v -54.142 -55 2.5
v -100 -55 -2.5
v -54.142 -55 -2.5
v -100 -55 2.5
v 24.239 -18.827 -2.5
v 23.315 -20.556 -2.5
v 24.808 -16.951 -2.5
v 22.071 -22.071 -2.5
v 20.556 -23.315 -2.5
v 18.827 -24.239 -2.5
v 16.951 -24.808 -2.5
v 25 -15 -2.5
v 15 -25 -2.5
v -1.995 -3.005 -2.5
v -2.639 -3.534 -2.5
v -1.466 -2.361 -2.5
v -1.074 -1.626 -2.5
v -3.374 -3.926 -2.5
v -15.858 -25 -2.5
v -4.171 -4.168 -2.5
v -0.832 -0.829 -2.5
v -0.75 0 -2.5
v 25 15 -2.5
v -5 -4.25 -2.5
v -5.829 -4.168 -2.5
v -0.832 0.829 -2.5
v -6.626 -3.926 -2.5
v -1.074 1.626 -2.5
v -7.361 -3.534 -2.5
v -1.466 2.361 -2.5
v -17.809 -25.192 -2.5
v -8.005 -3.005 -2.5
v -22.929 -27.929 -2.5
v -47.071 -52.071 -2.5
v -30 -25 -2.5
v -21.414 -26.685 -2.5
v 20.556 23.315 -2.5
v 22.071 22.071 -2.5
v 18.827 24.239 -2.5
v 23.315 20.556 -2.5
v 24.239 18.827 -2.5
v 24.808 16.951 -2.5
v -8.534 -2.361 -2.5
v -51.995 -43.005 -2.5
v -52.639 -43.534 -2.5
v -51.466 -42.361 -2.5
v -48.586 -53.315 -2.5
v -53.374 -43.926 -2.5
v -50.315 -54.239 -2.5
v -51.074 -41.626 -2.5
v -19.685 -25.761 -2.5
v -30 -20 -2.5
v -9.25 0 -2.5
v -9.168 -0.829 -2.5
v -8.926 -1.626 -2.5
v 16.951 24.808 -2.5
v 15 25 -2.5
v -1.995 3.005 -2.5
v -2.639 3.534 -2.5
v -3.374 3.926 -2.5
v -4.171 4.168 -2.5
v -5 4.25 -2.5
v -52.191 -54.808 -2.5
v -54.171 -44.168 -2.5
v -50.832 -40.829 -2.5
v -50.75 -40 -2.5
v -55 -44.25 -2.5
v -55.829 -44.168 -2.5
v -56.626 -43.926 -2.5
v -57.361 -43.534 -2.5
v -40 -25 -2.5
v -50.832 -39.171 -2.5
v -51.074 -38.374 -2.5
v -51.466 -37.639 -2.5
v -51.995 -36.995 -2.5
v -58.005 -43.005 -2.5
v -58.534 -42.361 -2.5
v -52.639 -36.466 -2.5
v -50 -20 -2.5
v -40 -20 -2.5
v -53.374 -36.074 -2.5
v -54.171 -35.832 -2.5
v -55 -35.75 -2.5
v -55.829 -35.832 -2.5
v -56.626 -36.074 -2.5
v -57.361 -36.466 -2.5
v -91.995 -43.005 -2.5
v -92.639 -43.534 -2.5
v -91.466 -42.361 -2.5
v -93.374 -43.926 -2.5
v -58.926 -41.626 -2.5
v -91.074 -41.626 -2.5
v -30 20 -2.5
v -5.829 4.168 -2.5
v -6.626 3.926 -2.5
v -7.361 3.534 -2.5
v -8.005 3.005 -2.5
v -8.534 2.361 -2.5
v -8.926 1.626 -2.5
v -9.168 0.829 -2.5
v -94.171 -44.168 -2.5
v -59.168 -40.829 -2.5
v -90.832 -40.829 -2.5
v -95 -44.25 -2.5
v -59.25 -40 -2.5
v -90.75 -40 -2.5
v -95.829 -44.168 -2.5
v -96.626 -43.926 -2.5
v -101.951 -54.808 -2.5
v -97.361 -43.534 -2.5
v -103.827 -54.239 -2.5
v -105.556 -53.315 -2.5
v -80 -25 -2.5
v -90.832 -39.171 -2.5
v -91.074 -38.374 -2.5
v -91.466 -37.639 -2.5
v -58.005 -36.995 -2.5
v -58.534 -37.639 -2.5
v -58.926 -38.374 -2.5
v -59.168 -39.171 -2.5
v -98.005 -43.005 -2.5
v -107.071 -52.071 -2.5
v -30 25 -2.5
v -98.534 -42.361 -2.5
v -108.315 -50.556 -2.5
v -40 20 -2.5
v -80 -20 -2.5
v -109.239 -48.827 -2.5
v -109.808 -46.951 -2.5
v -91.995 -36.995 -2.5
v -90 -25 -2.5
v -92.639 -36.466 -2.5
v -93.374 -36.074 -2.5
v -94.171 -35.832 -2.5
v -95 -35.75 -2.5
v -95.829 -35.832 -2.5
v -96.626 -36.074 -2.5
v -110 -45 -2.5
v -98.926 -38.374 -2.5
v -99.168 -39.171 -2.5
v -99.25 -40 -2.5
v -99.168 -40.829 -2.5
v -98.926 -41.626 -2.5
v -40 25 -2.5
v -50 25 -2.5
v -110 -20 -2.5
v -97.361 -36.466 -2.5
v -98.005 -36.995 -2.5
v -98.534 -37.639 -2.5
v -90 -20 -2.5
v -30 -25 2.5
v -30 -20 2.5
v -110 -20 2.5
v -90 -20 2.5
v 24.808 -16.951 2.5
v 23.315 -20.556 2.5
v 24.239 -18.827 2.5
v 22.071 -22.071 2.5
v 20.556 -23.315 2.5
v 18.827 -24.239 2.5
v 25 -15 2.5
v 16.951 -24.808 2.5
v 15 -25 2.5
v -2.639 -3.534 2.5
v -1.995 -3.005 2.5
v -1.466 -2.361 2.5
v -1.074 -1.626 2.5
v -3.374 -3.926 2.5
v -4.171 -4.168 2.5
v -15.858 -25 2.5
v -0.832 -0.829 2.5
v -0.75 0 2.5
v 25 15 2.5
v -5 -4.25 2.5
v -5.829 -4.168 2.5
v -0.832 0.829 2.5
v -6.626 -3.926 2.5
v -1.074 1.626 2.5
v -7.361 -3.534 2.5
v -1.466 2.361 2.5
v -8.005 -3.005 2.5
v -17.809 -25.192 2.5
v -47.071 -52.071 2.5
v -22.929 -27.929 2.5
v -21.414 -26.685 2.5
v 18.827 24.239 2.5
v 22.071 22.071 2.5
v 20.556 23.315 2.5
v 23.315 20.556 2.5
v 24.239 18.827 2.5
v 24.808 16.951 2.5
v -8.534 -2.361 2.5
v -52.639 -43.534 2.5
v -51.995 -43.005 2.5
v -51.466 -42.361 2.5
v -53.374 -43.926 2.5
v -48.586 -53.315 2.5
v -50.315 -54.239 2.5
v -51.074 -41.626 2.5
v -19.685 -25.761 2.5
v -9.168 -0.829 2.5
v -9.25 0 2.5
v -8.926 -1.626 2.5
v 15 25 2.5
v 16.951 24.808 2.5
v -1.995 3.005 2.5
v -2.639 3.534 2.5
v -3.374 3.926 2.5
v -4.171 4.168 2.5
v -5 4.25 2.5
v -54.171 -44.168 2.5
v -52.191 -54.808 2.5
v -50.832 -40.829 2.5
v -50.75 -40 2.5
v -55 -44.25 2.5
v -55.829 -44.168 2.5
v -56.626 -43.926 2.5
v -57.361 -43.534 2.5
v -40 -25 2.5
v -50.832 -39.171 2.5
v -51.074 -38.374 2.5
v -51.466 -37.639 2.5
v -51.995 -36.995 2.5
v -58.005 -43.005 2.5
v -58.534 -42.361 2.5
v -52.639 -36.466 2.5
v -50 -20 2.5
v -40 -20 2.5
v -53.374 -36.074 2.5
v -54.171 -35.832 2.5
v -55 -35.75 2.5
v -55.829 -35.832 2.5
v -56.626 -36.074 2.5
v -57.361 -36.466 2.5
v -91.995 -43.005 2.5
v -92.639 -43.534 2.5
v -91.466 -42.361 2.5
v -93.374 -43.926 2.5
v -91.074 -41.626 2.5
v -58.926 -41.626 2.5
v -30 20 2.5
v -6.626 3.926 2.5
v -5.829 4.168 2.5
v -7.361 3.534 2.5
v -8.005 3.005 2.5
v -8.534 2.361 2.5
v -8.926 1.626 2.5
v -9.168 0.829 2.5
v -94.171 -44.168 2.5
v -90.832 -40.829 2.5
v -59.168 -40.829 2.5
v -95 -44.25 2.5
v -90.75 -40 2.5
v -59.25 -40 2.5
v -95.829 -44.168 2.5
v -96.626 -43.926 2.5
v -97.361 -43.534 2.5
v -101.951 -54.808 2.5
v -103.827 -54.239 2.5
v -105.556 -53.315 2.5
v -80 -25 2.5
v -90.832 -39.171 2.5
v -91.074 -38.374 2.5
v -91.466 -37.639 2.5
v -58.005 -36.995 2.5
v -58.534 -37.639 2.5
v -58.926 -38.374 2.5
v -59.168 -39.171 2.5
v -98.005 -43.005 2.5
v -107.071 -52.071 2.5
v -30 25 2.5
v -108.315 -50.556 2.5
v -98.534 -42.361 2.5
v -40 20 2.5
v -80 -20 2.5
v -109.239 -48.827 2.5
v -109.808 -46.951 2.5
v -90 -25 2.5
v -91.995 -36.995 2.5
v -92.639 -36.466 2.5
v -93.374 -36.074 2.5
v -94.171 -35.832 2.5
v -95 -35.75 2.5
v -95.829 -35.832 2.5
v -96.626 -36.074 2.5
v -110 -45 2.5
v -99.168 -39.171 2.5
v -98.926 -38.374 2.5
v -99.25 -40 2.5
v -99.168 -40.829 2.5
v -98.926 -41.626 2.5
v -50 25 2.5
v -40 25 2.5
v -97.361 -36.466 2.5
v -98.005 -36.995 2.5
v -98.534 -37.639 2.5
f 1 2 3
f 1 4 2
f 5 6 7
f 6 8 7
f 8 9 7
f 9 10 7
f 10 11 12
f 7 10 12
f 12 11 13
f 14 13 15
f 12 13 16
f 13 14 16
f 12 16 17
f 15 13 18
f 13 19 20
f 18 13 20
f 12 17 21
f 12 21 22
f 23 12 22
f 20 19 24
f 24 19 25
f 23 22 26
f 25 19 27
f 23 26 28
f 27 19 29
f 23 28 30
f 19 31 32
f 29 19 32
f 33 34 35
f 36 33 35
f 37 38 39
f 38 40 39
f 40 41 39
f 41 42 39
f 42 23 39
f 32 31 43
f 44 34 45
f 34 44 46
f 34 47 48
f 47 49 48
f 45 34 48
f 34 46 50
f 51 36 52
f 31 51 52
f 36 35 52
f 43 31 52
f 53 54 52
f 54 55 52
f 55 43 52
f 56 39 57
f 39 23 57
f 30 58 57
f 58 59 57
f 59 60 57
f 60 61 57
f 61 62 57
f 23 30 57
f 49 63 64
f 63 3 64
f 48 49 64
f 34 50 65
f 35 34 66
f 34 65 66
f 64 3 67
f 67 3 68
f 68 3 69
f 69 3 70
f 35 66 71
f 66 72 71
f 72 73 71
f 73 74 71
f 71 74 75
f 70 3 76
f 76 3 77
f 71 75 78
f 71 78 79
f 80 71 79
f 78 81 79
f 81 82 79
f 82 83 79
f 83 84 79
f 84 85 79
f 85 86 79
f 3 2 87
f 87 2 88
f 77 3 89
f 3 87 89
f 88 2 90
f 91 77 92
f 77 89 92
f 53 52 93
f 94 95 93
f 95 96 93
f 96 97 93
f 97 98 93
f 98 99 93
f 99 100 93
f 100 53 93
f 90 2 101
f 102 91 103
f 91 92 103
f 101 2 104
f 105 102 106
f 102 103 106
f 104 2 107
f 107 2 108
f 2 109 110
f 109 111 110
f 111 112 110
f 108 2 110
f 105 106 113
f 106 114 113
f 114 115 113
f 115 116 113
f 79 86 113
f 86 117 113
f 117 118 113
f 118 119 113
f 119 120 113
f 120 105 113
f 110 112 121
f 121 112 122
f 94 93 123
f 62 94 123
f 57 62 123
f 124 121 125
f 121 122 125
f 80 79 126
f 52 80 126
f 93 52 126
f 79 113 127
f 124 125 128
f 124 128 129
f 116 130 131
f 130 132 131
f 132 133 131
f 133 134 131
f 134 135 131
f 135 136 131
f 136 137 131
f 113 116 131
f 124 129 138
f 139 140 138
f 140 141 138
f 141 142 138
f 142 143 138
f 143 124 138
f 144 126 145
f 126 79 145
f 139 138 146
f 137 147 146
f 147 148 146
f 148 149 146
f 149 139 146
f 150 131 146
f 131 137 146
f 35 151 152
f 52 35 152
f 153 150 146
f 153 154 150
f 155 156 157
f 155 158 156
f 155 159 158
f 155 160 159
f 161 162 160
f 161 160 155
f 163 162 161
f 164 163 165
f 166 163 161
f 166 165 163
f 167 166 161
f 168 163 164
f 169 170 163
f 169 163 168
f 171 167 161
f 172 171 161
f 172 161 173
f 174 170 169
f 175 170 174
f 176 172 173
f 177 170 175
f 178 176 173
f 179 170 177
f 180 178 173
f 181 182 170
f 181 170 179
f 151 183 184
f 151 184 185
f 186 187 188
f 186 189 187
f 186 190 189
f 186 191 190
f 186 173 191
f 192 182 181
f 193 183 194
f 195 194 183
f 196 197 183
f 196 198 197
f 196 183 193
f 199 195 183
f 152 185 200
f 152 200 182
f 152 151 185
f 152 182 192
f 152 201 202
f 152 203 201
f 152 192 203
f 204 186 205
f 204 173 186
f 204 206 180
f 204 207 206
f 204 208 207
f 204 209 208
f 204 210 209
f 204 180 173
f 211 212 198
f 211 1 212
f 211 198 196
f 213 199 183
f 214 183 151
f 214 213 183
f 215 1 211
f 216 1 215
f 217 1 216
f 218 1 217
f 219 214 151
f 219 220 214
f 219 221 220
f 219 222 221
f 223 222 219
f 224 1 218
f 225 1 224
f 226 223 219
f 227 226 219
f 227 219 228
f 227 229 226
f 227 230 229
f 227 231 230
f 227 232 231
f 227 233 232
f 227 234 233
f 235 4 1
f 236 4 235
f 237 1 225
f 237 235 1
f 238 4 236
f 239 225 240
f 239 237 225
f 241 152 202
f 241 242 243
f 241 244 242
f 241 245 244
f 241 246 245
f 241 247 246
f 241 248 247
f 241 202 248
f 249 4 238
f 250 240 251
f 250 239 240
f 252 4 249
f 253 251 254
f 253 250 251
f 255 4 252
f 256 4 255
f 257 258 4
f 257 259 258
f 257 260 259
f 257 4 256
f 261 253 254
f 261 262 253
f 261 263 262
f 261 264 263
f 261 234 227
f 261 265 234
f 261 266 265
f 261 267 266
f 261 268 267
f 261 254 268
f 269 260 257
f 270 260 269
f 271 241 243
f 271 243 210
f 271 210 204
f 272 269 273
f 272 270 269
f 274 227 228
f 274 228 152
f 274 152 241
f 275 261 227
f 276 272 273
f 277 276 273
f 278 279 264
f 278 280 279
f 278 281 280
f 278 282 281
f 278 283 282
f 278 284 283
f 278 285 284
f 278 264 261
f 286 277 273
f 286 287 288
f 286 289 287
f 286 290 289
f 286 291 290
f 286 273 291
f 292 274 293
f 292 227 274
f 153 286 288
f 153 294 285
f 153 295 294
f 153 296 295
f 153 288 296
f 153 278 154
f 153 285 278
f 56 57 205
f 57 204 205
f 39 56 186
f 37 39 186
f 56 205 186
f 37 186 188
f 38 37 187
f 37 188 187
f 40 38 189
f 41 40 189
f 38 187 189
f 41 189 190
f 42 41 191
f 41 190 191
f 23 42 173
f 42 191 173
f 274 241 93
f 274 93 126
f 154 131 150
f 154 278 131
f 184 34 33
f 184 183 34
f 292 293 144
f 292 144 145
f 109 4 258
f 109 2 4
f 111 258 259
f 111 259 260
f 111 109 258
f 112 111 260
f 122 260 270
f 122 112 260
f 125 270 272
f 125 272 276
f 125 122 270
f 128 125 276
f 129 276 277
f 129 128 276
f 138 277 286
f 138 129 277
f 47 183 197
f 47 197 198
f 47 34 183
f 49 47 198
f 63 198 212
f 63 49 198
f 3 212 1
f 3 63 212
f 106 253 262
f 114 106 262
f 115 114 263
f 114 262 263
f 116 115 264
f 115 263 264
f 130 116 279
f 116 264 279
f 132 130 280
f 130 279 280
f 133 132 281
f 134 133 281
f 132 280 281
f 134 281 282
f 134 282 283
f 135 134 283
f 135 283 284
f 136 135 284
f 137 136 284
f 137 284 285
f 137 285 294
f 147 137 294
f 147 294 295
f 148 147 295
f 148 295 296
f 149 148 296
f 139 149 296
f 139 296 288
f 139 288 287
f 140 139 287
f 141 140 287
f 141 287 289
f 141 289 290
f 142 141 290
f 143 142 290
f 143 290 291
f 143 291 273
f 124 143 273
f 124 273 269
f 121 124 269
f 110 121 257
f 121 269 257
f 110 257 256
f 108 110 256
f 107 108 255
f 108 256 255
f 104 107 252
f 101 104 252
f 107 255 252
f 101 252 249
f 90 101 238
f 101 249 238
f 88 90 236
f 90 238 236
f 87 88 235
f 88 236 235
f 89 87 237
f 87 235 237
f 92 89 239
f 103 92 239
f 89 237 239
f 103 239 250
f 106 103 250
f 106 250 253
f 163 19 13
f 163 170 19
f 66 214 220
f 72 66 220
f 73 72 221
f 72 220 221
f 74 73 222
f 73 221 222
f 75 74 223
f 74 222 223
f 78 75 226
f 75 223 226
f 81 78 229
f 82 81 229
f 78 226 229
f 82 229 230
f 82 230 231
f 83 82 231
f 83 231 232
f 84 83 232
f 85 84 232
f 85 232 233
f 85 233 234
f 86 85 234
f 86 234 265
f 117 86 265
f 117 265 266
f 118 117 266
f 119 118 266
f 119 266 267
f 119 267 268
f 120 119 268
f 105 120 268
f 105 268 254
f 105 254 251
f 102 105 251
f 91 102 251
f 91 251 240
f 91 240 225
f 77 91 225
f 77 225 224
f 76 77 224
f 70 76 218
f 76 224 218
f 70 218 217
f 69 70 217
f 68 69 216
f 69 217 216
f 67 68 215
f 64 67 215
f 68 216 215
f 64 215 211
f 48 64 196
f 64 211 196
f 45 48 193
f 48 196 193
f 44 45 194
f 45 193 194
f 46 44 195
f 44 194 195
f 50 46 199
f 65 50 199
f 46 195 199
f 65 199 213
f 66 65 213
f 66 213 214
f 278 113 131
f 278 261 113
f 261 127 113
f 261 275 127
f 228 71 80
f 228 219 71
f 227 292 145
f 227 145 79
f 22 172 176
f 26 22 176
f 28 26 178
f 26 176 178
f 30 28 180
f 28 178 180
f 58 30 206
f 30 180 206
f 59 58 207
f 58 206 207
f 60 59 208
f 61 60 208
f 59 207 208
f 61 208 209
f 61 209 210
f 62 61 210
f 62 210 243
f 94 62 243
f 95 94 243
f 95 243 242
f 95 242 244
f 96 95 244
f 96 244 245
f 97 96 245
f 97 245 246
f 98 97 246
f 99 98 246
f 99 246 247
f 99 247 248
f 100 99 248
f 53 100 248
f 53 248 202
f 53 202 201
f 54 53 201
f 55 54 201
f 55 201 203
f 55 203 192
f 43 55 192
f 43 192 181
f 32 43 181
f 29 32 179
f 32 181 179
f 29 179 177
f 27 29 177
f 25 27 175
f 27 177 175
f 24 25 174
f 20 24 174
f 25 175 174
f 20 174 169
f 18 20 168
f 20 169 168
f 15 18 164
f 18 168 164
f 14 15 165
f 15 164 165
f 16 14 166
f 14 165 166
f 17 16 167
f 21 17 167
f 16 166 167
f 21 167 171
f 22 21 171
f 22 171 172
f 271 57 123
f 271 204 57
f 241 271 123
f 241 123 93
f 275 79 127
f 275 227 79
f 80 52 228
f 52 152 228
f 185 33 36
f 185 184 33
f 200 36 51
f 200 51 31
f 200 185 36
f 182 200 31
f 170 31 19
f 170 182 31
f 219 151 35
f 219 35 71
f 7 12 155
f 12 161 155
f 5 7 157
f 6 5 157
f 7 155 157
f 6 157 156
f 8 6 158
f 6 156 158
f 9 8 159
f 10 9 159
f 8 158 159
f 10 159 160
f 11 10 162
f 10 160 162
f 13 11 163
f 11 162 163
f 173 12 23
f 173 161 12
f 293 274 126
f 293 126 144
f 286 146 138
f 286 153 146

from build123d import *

# Parameters (mm, degrees)
SKETCH1_W           = 5
SKETCH1_H           = 10
BOSS_EXTRUDE1_DEPTH = 2.5
FILLET1_R           = 10
CUT_EXTRUDE1_REACH  = 125.085
SKETCH2_R           = 4.25


with BuildPart() as part:
    # Sketch1 → Boss-Extrude1 (new, symmetric)
    with BuildSketch(Plane(origin=(0, 0, 0), x_dir=(0, 1, 0), z_dir=(0, 0, 1))):
        Polygon((-55, 50), (-25, 20), (-25, -25), (25, -25), (25, 30), (20, 30), (20, 40), (25, 40), (25, 50), (-20, 50), (-20, 80), (-25, 80), (-25, 90), (-20, 90), (-20, 110), (-55, 110), align=None)
        with Locations((-22.5, 35)):
            Rectangle(SKETCH1_W, SKETCH1_H, mode=Mode.SUBTRACT)
    extrude(amount=BOSS_EXTRUDE1_DEPTH, both=True)

    # Fillet1
    fillet1_edges = [part.edges().sort_by_distance(p)[0] for p in [
        (-50, -55, 0),
        (-110, -55, 0),
        (25, 25, 0),
        (25, -25, 0),
        (-20, -25, 0),
    ]]
    fillet(fillet1_edges, radius=FILLET1_R)

    # Sketch2 → Cut-Extrude1 (cut, up to next)
    with BuildSketch(Plane.XY.offset(2.5), mode=Mode.PRIVATE) as cut_extrude1_sk1:
        with Locations((-95, -40)):
            Circle(SKETCH2_R)
    cut_extrude1_tool1 = extrude(cut_extrude1_sk1.sketch, amount=-CUT_EXTRUDE1_REACH, mode=Mode.PRIVATE) & part.part
    # Sketch2 → Cut-Extrude1 (cut, up to next)
    with BuildSketch(Plane.XY.offset(2.5), mode=Mode.PRIVATE) as cut_extrude1_sk2:
        with Locations((-55, -40)):
            Circle(SKETCH2_R)
    cut_extrude1_tool2 = extrude(cut_extrude1_sk2.sketch, amount=-CUT_EXTRUDE1_REACH, mode=Mode.PRIVATE) & part.part
    # Sketch2 → Cut-Extrude1 (cut, up to next)
    with BuildSketch(Plane.XY.offset(2.5), mode=Mode.PRIVATE) as cut_extrude1_sk3:
        with Locations((-5, 0)):
            Circle(SKETCH2_R)
    cut_extrude1_tool3 = extrude(cut_extrude1_sk3.sketch, amount=-CUT_EXTRUDE1_REACH, mode=Mode.PRIVATE) & part.part
    add(cut_extrude1_tool1.solids().sort_by_distance((-95, -40, 2.5))[0], mode=Mode.SUBTRACT)
    add(cut_extrude1_tool2.solids().sort_by_distance((-55, -40, 2.5))[0], mode=Mode.SUBTRACT)
    add(cut_extrude1_tool3.solids().sort_by_distance((-5, 0, 2.5))[0], mode=Mode.SUBTRACT)


solid = part.part
